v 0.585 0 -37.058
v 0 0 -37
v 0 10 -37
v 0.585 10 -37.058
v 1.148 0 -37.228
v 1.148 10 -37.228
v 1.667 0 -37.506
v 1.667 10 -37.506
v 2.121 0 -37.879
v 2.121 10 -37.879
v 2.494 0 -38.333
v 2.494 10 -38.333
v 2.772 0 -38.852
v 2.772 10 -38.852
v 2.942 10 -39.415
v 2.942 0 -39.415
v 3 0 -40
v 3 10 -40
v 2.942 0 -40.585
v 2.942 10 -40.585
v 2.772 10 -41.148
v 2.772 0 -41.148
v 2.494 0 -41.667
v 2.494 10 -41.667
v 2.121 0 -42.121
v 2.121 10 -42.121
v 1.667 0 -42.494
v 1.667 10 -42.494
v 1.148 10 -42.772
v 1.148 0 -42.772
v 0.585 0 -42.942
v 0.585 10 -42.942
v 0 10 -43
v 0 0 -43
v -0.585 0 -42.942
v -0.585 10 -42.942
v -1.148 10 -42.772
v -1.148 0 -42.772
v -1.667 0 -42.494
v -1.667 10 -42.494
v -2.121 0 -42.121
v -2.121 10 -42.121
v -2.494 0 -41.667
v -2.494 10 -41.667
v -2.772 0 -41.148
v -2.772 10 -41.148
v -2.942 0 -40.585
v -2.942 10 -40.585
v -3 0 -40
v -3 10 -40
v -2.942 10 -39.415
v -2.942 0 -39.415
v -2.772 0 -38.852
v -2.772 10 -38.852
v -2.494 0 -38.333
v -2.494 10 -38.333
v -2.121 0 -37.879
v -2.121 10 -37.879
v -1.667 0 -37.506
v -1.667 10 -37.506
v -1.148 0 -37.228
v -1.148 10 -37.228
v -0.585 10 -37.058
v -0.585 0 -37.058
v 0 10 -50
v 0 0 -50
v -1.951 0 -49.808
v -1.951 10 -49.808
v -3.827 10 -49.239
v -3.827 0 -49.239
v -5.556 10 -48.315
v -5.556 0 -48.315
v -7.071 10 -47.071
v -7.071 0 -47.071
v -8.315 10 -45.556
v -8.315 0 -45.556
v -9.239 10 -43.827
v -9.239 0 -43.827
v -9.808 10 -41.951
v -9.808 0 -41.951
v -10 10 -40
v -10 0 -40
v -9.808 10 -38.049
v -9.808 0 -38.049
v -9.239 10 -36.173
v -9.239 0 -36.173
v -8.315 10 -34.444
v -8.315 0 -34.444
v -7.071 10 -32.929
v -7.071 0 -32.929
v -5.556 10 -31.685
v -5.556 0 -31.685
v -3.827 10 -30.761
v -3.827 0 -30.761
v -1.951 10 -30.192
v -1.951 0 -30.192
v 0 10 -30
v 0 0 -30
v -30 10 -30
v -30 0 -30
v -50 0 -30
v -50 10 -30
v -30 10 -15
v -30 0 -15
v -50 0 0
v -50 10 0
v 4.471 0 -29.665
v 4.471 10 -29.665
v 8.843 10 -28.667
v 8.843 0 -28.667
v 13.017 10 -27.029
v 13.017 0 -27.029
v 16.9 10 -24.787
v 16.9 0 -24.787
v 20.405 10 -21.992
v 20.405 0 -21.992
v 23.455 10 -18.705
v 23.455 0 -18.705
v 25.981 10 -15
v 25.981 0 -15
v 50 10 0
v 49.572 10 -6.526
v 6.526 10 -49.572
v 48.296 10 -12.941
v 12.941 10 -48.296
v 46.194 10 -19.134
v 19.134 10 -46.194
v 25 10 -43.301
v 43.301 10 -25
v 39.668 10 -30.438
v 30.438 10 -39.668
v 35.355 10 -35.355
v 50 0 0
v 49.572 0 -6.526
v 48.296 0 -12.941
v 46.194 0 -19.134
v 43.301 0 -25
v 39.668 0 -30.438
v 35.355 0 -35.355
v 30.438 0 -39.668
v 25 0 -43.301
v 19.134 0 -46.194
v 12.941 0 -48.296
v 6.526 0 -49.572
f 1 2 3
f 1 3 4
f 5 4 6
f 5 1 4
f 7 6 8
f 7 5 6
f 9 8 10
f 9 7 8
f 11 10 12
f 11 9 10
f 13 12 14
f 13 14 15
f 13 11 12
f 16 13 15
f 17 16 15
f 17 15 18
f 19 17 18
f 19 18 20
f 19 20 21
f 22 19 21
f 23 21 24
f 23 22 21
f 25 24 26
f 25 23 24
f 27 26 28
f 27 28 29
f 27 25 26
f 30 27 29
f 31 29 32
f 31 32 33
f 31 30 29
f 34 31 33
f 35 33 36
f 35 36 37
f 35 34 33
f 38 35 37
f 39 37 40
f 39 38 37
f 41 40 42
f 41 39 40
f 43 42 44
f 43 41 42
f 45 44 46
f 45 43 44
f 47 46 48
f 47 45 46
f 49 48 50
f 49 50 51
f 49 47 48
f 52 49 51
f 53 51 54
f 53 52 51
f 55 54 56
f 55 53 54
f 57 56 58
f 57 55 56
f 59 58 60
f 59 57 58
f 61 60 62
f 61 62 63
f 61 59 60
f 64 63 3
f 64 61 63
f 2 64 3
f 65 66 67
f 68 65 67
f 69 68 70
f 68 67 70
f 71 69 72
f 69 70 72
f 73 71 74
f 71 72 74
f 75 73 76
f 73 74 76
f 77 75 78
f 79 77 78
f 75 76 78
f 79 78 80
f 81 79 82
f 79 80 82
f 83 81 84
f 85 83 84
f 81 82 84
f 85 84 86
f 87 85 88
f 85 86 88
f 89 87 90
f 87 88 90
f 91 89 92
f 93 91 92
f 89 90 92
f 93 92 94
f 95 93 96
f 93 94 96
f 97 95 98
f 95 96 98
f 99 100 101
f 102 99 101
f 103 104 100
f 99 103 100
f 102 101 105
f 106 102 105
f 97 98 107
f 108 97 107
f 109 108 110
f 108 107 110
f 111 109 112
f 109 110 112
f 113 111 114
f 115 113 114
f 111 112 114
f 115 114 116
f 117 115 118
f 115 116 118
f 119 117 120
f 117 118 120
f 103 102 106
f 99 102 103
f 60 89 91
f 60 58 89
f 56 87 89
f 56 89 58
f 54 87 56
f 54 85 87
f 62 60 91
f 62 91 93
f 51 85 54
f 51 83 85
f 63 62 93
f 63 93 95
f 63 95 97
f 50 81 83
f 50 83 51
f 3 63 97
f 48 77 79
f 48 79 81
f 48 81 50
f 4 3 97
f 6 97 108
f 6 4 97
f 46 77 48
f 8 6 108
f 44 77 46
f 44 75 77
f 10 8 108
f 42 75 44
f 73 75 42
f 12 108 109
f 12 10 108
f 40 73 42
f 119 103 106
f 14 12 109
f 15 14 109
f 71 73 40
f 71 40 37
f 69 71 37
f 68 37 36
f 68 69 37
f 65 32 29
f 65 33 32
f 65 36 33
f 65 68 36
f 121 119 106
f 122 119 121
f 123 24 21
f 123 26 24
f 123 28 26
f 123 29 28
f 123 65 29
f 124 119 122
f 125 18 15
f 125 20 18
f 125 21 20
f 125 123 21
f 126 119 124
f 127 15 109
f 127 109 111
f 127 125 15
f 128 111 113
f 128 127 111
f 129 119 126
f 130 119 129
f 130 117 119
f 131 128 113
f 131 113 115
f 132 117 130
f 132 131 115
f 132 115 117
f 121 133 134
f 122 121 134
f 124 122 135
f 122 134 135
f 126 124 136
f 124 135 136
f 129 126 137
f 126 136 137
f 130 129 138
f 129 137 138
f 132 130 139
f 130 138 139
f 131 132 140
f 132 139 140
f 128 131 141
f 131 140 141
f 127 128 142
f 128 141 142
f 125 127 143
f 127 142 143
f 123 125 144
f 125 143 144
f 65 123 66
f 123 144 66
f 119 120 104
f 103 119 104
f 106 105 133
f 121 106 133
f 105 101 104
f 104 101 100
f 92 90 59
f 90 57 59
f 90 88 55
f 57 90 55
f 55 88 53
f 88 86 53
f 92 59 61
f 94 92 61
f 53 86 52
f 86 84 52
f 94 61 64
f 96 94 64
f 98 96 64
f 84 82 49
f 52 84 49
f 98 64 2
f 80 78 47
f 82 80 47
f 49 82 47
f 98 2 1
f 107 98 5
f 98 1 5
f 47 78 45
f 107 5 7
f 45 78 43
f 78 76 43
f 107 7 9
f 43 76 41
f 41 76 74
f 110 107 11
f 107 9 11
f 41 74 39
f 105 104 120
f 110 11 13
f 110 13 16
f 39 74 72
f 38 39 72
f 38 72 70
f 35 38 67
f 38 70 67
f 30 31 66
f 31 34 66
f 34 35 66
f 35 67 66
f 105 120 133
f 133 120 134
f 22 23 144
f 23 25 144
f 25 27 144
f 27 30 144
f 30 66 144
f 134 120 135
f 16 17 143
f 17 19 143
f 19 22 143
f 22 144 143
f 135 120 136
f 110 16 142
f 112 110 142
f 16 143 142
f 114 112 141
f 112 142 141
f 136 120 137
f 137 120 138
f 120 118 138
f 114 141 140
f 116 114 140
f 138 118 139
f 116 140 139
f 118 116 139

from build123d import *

# Parameters (mm, degrees)
SKETCH_1_R      = 3
EXTRUDE_1_DEPTH = 10


with BuildPart() as part:
    # 草图1 → 凸台-拉伸1 (new body)
    with BuildSketch(Plane(origin=(0, 0, 0), x_dir=(1, 0, 0), z_dir=(0, 1, 0))):
        with BuildLine():
            Line((-50, 0), (0, 0))
            Line((0, 0), (50, 0))
            ThreePointArc((50, 0), (35.355339059, 35.355339059), (0, 50))
            ThreePointArc((0, 50), (-10, 40), (0, 30))
            ThreePointArc((0, 30), (15, 25.980762114), (25.980762114, 15))
            Line((25.980762114, 15), (-30, 15))
            Line((-30, 15), (-30, 30))
            Line((-30, 30), (-50, 30))
            Line((-50, 30), (-50, 0))
        make_face()
        with Locations(Location((0, 40, 0), (0, 0, 270))):
            Circle(SKETCH_1_R, mode=Mode.SUBTRACT)
    extrude(amount=EXTRUDE_1_DEPTH)


solid = part.part
